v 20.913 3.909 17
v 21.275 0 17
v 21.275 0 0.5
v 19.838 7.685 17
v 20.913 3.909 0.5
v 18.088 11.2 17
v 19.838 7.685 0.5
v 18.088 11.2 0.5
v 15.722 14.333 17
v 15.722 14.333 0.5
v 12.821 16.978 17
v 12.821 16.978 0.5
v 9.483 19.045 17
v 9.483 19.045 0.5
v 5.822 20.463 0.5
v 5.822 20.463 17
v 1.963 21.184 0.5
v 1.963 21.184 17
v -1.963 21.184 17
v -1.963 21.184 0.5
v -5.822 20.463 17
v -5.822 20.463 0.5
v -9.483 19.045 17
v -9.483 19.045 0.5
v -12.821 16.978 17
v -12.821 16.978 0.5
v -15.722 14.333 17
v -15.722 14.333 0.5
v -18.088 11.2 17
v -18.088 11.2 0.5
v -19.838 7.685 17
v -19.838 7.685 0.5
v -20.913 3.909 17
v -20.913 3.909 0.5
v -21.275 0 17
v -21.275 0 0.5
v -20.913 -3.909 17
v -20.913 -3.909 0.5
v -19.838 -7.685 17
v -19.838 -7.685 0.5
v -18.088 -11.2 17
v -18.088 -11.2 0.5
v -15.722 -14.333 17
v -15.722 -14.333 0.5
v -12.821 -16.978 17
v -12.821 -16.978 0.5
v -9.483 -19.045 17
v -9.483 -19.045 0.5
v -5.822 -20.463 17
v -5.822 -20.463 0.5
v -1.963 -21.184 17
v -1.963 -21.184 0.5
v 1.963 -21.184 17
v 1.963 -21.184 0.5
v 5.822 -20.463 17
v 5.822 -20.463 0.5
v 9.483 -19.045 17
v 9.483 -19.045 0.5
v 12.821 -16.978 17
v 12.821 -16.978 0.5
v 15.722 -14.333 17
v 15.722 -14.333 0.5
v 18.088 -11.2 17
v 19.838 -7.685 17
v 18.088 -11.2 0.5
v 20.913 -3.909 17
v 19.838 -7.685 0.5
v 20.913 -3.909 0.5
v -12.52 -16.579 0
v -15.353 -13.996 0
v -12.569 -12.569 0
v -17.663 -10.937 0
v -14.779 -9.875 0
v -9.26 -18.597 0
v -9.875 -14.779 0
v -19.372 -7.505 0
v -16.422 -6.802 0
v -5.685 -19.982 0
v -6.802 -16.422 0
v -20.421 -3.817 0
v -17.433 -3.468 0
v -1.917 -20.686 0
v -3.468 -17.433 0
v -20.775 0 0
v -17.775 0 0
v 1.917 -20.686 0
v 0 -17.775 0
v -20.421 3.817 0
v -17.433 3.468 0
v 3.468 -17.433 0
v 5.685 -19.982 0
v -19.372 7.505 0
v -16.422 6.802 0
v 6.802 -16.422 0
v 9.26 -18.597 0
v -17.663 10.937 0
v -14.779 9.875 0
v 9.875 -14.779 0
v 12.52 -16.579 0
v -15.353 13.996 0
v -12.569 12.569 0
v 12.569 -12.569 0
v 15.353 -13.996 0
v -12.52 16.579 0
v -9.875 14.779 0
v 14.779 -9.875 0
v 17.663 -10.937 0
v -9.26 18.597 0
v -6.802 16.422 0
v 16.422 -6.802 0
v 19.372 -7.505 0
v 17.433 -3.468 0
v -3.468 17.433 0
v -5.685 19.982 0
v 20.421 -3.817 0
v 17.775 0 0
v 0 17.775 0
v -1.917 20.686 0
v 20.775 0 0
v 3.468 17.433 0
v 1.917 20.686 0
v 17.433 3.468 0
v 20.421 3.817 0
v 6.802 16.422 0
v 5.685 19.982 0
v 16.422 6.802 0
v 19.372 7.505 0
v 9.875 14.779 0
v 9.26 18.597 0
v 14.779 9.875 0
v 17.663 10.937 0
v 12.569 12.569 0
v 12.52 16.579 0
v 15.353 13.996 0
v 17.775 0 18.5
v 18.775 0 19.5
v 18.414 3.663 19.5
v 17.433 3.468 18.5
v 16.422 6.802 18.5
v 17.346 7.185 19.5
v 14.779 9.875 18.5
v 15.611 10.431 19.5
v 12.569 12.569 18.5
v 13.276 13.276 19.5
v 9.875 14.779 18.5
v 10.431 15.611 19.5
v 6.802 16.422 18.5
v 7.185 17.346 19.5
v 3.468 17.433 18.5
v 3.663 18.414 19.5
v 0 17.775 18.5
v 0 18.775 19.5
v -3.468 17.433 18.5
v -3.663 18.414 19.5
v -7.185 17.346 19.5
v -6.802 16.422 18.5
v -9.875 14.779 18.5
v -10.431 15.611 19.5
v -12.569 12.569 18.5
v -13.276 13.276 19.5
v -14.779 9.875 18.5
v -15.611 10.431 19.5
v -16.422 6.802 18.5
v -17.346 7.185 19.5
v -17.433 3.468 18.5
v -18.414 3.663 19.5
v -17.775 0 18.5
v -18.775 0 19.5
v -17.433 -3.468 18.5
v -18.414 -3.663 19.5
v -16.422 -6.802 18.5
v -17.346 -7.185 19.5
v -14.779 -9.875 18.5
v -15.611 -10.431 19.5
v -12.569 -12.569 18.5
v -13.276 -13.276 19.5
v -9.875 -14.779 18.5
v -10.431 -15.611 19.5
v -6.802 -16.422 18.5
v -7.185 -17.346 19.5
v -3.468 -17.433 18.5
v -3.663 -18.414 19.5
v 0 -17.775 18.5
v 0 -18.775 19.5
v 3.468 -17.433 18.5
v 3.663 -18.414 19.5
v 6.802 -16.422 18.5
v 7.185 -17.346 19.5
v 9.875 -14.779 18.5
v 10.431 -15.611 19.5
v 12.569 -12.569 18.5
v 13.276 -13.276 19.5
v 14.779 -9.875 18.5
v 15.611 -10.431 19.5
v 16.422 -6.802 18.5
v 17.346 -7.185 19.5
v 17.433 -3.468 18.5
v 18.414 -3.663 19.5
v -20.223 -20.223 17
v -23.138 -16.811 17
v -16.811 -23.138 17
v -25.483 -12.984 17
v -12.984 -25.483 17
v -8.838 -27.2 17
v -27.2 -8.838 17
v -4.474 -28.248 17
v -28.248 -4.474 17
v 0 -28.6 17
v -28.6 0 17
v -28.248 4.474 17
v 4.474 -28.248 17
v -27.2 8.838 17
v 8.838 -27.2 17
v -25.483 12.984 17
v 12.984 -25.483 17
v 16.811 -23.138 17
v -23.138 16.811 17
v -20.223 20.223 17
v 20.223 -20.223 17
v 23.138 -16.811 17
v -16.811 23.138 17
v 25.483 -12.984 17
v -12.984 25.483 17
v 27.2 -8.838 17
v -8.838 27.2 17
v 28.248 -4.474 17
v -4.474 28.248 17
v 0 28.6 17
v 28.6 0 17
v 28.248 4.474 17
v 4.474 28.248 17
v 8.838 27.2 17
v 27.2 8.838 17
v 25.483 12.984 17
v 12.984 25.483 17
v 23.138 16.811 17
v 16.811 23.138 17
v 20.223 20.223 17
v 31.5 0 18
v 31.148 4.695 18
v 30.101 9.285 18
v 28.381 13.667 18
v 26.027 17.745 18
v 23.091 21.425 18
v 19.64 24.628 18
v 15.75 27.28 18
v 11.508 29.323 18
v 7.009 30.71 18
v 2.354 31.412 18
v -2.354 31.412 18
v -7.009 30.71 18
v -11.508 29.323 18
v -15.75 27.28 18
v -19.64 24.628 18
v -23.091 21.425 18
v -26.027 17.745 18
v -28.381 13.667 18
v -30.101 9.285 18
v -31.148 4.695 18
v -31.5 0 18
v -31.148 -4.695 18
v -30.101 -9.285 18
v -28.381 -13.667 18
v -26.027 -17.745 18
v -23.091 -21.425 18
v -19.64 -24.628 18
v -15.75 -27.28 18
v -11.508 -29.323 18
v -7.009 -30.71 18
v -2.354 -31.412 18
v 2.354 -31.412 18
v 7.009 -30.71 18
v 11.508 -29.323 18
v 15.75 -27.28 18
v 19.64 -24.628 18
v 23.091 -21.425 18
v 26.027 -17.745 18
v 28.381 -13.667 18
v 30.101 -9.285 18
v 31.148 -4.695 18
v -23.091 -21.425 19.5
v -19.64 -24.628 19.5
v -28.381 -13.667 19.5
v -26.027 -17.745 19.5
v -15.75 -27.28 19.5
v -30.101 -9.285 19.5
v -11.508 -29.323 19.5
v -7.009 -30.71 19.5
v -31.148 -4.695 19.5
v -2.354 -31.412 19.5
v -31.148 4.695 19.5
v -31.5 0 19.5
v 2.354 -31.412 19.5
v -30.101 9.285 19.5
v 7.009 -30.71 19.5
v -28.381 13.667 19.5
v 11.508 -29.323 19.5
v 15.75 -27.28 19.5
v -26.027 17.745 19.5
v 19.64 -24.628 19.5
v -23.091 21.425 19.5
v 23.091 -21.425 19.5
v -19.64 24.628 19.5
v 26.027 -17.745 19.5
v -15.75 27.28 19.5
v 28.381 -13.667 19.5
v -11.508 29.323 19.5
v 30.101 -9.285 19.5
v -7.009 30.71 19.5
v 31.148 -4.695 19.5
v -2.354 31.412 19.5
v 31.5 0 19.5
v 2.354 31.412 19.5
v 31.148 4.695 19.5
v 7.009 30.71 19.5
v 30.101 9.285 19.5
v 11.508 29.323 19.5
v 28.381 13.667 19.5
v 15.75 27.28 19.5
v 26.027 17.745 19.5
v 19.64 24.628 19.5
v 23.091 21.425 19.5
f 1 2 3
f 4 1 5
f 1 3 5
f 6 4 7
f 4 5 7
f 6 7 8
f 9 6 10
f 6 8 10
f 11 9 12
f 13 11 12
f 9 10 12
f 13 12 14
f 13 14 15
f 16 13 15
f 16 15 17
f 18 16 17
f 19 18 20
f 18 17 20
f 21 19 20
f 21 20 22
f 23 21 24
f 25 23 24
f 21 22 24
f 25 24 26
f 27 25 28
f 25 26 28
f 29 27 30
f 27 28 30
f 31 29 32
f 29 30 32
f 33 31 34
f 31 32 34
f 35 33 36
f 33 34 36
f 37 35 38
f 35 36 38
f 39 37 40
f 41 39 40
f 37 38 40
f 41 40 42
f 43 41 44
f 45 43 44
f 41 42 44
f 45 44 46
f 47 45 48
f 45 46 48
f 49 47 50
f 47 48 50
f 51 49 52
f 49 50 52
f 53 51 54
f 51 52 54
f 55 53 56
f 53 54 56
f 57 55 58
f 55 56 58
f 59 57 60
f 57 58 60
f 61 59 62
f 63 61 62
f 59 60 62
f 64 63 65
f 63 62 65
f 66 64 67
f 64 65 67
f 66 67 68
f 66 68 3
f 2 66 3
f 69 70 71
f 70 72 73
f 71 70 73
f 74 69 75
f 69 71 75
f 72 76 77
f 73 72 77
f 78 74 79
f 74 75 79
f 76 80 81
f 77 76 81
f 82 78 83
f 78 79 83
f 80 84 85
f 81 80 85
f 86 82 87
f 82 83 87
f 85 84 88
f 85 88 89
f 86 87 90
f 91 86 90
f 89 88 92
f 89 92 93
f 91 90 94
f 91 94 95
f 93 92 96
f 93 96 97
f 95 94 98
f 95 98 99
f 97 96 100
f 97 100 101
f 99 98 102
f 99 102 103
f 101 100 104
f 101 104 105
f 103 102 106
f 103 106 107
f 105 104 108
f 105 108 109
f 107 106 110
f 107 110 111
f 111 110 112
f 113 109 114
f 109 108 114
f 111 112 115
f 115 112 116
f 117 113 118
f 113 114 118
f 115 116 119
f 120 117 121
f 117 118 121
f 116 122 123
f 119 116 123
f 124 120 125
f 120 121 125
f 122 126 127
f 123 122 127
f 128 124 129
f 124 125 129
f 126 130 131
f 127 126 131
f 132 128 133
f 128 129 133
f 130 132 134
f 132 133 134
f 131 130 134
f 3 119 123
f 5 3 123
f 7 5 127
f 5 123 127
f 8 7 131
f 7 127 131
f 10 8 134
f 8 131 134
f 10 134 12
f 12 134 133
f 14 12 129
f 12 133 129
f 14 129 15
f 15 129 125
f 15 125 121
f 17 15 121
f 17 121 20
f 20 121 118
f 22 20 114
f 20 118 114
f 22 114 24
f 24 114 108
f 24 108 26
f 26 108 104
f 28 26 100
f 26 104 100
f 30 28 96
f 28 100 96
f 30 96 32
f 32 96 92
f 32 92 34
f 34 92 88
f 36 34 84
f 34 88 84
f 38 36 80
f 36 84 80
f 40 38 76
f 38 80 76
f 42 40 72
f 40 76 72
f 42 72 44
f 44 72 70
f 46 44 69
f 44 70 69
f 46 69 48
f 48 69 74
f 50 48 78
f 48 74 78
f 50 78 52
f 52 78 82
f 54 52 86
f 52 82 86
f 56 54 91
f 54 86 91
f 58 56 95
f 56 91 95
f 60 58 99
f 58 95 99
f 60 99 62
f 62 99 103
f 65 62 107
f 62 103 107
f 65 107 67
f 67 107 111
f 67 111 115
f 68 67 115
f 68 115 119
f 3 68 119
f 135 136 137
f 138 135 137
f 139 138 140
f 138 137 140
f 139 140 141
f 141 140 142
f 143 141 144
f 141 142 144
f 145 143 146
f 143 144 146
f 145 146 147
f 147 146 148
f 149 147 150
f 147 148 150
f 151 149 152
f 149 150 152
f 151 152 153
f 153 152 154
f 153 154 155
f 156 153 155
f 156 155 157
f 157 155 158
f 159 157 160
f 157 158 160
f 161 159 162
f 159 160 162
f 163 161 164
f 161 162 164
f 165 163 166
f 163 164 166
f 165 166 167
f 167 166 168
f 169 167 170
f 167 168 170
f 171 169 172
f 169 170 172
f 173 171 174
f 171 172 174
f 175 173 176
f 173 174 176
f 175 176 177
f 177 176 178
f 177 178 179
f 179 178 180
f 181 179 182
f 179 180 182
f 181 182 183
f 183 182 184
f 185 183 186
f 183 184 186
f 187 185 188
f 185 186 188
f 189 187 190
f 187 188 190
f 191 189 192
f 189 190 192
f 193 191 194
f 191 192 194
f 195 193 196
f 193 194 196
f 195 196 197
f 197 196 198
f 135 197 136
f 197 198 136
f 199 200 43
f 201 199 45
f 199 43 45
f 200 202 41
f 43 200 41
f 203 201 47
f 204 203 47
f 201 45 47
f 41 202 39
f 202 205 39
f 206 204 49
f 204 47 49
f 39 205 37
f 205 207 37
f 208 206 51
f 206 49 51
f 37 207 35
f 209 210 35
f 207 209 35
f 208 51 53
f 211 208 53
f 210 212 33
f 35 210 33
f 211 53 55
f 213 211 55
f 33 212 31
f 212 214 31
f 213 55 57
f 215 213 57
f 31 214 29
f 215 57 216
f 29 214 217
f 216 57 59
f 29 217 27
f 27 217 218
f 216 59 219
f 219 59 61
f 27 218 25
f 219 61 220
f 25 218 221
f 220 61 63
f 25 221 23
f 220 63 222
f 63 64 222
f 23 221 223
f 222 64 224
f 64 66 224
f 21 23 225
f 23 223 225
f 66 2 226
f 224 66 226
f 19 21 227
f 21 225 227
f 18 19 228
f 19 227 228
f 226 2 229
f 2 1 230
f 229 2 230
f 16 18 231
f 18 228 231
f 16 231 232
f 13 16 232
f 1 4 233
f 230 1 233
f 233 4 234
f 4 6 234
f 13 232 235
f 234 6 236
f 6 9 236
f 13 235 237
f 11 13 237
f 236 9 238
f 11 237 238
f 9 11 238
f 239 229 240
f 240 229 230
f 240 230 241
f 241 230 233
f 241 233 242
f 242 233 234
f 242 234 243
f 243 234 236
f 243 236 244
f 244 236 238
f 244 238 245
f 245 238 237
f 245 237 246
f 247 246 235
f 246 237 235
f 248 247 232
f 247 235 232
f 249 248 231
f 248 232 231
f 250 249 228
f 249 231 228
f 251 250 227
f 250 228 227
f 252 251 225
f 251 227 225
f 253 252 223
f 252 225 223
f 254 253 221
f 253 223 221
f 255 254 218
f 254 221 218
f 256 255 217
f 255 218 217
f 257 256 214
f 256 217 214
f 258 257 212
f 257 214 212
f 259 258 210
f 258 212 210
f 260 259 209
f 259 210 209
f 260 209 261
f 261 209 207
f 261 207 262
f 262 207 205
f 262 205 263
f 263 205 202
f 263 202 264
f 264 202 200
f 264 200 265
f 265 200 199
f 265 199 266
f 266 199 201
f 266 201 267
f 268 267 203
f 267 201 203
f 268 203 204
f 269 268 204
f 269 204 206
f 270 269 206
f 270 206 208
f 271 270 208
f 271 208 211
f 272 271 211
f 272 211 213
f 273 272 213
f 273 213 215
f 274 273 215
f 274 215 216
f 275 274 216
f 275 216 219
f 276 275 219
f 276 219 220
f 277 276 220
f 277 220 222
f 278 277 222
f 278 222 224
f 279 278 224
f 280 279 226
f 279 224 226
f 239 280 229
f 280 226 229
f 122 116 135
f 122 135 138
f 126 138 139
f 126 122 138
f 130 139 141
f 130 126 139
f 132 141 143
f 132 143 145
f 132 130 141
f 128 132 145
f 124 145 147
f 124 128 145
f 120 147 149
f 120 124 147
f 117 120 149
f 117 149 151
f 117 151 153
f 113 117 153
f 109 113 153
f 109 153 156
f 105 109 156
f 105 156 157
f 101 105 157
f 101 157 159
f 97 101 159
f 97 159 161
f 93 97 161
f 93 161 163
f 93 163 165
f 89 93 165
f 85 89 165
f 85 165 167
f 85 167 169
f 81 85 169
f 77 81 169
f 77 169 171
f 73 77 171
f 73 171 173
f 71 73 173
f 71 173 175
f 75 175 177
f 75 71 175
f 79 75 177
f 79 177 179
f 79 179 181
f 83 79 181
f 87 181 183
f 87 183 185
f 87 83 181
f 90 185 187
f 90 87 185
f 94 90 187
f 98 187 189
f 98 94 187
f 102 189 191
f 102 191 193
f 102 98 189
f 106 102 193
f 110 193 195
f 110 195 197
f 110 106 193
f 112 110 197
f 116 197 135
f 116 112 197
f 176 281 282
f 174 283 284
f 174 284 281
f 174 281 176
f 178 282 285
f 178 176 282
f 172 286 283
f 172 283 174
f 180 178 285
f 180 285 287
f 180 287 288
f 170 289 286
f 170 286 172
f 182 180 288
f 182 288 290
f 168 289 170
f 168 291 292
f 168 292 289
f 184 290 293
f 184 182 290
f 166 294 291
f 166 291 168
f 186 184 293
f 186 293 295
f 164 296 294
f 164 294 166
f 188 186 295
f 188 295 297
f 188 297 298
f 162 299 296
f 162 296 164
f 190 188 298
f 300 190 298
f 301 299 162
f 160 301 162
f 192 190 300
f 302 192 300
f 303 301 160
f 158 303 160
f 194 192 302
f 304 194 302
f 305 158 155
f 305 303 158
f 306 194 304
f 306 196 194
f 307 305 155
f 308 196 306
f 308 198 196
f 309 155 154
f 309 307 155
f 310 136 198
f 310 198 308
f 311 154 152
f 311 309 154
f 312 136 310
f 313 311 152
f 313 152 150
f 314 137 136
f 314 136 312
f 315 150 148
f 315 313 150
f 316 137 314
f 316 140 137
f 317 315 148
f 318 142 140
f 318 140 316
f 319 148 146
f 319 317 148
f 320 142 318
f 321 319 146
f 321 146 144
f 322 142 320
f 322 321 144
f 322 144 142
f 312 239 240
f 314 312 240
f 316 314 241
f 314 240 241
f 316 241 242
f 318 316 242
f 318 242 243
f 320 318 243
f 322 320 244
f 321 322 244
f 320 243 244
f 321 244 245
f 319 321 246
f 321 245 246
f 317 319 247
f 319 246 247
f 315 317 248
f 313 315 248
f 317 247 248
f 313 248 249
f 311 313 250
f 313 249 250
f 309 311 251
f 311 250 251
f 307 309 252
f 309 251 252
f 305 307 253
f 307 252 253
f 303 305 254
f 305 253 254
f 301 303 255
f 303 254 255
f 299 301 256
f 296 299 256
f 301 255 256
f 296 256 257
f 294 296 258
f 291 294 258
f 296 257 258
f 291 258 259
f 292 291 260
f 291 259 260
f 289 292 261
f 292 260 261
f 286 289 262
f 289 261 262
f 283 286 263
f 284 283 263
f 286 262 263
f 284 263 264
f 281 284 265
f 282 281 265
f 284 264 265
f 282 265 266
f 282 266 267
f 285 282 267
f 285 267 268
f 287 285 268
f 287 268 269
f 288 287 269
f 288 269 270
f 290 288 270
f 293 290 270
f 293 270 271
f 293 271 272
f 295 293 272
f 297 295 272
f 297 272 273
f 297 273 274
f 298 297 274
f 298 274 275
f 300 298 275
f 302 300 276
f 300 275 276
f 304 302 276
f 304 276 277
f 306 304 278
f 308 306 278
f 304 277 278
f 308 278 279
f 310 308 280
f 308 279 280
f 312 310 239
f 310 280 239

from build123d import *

# Parameters (mm, degrees)
F0_R     = 21.275
F0_R_2   = 17.775
F1_DEPTH = 17
F2_R     = 31.5
F2_R_2   = 17.775
F3_DEPTH = 2.5
F4_SIZE2 = 2.9
F4_SIZE  = 1
F5_SIZE  = 0.5
F6_SIZE  = 1


with BuildPart() as f1:
    # F0 (on Top) → F1 (new body)
    with BuildSketch(Plane.XY):
        Circle(F0_R)
        Circle(F0_R_2, mode=Mode.SUBTRACT)
    extrude(amount=F1_DEPTH)

    # F2 (on face) → F3 (join)
    with BuildSketch(Plane.XY.offset(17)):
        Circle(F2_R)
        Circle(F2_R_2, mode=Mode.SUBTRACT)
    extrude(amount=F3_DEPTH)

    # F4
    f4_edges = [f1.edges().sort_by_distance(p)[0] for p in [
        (-31.5, 0, 17),
    ]]
    f4_side = f1.faces().sort_by_distance((-31.5, 0, 18.25))[0]
    chamfer(f4_edges, length=F4_SIZE, length2=F4_SIZE2, reference=f4_side)

    # F5
    f5_edges = [f1.edges().sort_by_distance(p)[0] for p in [
        (-21.275, 0, 0),
    ]]
    chamfer(f5_edges, length=F5_SIZE)

    # F6
    f6_edges = [f1.edges().sort_by_distance(p)[0] for p in [
        (-17.775, 0, 19.5),
    ]]
    chamfer(f6_edges, length=F6_SIZE)


solid = f1.part
